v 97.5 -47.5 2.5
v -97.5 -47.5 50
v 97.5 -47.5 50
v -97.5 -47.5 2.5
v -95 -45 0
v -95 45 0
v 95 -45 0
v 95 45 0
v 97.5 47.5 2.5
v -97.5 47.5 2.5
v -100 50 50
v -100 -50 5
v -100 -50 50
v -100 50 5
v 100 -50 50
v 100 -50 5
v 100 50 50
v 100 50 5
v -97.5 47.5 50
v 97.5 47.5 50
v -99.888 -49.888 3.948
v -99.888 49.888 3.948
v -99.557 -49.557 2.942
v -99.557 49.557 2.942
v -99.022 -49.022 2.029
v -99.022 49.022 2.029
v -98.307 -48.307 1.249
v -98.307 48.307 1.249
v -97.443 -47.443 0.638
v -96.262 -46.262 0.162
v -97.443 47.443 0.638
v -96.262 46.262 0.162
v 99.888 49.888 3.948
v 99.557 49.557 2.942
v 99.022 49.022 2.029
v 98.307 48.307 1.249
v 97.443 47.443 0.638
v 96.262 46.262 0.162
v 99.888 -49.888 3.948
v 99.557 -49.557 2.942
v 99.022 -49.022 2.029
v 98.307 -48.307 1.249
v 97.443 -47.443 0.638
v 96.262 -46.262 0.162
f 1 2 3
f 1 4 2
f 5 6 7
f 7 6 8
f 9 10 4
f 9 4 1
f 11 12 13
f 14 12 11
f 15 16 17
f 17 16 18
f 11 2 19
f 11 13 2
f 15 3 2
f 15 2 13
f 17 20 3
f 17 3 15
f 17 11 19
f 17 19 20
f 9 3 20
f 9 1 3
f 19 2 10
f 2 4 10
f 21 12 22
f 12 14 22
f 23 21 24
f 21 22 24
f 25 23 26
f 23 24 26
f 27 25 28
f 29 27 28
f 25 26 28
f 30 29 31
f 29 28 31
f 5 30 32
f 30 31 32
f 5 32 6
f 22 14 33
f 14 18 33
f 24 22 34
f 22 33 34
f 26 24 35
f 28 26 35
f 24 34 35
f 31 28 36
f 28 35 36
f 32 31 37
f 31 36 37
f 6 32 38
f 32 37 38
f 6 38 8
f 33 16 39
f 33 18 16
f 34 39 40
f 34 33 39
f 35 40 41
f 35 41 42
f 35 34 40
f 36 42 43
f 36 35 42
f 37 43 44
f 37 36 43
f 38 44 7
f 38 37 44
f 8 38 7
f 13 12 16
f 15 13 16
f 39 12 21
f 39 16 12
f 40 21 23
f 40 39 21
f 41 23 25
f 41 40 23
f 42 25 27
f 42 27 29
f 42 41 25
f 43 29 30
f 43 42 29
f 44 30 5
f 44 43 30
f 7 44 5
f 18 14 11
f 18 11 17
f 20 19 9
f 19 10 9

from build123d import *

# Parameters (mm, degrees)
F0_W     = 200
F0_H     = 100
F1_DEPTH = 50
F2_T     = -2.5
F3_R     = 5


with BuildPart() as f1:
    # F0 (on Top) → F1 (new body)
    with BuildSketch(Plane.XY):
        Rectangle(F0_W, F0_H)
    extrude(amount=F1_DEPTH)

    # F2
    f2_openings = [f1.faces().sort_by_distance(p)[0] for p in [
        (0, 0, 50),
    ]]
    offset(amount=F2_T, openings=f2_openings)

    # F3
    f3_edges = [f1.edges().sort_by_distance(p)[0] for p in [
        (0, -50, 0),
        (100, 0, 0),
        (0, 50, 0),
        (-100, 0, 0),
    ]]
    fillet(f3_edges, radius=F3_R)


solid = f1.part
